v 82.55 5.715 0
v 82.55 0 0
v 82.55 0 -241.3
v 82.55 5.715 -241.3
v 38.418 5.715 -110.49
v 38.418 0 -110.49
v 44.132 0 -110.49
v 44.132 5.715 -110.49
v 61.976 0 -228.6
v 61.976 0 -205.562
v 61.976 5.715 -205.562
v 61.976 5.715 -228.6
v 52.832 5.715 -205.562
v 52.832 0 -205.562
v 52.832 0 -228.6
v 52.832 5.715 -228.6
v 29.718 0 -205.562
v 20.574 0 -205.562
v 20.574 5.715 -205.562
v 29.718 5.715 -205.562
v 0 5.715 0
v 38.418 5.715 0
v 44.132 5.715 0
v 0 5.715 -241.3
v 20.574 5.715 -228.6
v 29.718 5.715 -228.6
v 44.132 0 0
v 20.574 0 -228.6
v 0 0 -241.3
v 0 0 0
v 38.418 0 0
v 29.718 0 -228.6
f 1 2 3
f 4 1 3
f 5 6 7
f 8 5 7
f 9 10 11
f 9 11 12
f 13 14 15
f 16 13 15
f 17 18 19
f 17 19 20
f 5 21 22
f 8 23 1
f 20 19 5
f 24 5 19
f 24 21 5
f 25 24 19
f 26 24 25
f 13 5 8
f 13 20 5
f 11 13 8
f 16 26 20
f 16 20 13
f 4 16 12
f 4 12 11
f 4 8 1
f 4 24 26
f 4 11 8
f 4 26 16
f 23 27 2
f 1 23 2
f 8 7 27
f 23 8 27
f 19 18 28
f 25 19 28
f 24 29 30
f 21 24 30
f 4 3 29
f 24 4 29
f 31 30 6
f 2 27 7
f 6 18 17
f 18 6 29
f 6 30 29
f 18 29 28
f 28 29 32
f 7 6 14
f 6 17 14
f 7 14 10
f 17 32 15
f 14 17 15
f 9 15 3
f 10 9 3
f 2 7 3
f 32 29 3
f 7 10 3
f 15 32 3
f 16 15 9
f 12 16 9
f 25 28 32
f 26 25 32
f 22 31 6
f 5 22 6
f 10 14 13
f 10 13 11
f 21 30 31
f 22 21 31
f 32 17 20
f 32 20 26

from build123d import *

# Parameters (mm, degrees)
SKETCH1_W           = 9.144
SKETCH1_H           = 23.0378
BOSS_EXTRUDE1_DEPTH = 5.715


with BuildPart() as part:
    # Sketch1 → Boss-Extrude1 (new body)
    # profile 1 of 2: a face of its own
    with BuildSketch(Plane(origin=(0, 0, 0), x_dir=(1, 0, 0), z_dir=(0, 1, 0))):
        Polygon((38.4175, 110.49), (41.275, 110.49), (44.1325, 110.49), (44.1325, 0), (82.55, 0), (82.55, 241.3), (0, 241.3), (0, 0), (38.4175, 0), align=None)
        with Locations((25.146, 217.0811)):
            Rectangle(SKETCH1_W, SKETCH1_H, mode=Mode.SUBTRACT)
        with Locations((57.404, 217.0811)):
            Rectangle(SKETCH1_W, SKETCH1_H, mode=Mode.SUBTRACT)
    # profile 2 of 2: a face of its own
    with BuildSketch(Plane(origin=(0, 0, 0), x_dir=(1, 0, 0), z_dir=(0, 1, 0))):
        Polygon((38.4175, 110.49), (41.275, 110.49), (44.1325, 110.49), (44.1325, 0), (82.55, 0), (82.55, 241.3), (0, 241.3), (0, 0), (38.4175, 0), align=None)
        with Locations((25.146, 217.0811)):
            Rectangle(SKETCH1_W, SKETCH1_H, mode=Mode.SUBTRACT)
        with Locations((57.404, 217.0811)):
            Rectangle(SKETCH1_W, SKETCH1_H, mode=Mode.SUBTRACT)
    extrude(amount=BOSS_EXTRUDE1_DEPTH)


solid = part.part
